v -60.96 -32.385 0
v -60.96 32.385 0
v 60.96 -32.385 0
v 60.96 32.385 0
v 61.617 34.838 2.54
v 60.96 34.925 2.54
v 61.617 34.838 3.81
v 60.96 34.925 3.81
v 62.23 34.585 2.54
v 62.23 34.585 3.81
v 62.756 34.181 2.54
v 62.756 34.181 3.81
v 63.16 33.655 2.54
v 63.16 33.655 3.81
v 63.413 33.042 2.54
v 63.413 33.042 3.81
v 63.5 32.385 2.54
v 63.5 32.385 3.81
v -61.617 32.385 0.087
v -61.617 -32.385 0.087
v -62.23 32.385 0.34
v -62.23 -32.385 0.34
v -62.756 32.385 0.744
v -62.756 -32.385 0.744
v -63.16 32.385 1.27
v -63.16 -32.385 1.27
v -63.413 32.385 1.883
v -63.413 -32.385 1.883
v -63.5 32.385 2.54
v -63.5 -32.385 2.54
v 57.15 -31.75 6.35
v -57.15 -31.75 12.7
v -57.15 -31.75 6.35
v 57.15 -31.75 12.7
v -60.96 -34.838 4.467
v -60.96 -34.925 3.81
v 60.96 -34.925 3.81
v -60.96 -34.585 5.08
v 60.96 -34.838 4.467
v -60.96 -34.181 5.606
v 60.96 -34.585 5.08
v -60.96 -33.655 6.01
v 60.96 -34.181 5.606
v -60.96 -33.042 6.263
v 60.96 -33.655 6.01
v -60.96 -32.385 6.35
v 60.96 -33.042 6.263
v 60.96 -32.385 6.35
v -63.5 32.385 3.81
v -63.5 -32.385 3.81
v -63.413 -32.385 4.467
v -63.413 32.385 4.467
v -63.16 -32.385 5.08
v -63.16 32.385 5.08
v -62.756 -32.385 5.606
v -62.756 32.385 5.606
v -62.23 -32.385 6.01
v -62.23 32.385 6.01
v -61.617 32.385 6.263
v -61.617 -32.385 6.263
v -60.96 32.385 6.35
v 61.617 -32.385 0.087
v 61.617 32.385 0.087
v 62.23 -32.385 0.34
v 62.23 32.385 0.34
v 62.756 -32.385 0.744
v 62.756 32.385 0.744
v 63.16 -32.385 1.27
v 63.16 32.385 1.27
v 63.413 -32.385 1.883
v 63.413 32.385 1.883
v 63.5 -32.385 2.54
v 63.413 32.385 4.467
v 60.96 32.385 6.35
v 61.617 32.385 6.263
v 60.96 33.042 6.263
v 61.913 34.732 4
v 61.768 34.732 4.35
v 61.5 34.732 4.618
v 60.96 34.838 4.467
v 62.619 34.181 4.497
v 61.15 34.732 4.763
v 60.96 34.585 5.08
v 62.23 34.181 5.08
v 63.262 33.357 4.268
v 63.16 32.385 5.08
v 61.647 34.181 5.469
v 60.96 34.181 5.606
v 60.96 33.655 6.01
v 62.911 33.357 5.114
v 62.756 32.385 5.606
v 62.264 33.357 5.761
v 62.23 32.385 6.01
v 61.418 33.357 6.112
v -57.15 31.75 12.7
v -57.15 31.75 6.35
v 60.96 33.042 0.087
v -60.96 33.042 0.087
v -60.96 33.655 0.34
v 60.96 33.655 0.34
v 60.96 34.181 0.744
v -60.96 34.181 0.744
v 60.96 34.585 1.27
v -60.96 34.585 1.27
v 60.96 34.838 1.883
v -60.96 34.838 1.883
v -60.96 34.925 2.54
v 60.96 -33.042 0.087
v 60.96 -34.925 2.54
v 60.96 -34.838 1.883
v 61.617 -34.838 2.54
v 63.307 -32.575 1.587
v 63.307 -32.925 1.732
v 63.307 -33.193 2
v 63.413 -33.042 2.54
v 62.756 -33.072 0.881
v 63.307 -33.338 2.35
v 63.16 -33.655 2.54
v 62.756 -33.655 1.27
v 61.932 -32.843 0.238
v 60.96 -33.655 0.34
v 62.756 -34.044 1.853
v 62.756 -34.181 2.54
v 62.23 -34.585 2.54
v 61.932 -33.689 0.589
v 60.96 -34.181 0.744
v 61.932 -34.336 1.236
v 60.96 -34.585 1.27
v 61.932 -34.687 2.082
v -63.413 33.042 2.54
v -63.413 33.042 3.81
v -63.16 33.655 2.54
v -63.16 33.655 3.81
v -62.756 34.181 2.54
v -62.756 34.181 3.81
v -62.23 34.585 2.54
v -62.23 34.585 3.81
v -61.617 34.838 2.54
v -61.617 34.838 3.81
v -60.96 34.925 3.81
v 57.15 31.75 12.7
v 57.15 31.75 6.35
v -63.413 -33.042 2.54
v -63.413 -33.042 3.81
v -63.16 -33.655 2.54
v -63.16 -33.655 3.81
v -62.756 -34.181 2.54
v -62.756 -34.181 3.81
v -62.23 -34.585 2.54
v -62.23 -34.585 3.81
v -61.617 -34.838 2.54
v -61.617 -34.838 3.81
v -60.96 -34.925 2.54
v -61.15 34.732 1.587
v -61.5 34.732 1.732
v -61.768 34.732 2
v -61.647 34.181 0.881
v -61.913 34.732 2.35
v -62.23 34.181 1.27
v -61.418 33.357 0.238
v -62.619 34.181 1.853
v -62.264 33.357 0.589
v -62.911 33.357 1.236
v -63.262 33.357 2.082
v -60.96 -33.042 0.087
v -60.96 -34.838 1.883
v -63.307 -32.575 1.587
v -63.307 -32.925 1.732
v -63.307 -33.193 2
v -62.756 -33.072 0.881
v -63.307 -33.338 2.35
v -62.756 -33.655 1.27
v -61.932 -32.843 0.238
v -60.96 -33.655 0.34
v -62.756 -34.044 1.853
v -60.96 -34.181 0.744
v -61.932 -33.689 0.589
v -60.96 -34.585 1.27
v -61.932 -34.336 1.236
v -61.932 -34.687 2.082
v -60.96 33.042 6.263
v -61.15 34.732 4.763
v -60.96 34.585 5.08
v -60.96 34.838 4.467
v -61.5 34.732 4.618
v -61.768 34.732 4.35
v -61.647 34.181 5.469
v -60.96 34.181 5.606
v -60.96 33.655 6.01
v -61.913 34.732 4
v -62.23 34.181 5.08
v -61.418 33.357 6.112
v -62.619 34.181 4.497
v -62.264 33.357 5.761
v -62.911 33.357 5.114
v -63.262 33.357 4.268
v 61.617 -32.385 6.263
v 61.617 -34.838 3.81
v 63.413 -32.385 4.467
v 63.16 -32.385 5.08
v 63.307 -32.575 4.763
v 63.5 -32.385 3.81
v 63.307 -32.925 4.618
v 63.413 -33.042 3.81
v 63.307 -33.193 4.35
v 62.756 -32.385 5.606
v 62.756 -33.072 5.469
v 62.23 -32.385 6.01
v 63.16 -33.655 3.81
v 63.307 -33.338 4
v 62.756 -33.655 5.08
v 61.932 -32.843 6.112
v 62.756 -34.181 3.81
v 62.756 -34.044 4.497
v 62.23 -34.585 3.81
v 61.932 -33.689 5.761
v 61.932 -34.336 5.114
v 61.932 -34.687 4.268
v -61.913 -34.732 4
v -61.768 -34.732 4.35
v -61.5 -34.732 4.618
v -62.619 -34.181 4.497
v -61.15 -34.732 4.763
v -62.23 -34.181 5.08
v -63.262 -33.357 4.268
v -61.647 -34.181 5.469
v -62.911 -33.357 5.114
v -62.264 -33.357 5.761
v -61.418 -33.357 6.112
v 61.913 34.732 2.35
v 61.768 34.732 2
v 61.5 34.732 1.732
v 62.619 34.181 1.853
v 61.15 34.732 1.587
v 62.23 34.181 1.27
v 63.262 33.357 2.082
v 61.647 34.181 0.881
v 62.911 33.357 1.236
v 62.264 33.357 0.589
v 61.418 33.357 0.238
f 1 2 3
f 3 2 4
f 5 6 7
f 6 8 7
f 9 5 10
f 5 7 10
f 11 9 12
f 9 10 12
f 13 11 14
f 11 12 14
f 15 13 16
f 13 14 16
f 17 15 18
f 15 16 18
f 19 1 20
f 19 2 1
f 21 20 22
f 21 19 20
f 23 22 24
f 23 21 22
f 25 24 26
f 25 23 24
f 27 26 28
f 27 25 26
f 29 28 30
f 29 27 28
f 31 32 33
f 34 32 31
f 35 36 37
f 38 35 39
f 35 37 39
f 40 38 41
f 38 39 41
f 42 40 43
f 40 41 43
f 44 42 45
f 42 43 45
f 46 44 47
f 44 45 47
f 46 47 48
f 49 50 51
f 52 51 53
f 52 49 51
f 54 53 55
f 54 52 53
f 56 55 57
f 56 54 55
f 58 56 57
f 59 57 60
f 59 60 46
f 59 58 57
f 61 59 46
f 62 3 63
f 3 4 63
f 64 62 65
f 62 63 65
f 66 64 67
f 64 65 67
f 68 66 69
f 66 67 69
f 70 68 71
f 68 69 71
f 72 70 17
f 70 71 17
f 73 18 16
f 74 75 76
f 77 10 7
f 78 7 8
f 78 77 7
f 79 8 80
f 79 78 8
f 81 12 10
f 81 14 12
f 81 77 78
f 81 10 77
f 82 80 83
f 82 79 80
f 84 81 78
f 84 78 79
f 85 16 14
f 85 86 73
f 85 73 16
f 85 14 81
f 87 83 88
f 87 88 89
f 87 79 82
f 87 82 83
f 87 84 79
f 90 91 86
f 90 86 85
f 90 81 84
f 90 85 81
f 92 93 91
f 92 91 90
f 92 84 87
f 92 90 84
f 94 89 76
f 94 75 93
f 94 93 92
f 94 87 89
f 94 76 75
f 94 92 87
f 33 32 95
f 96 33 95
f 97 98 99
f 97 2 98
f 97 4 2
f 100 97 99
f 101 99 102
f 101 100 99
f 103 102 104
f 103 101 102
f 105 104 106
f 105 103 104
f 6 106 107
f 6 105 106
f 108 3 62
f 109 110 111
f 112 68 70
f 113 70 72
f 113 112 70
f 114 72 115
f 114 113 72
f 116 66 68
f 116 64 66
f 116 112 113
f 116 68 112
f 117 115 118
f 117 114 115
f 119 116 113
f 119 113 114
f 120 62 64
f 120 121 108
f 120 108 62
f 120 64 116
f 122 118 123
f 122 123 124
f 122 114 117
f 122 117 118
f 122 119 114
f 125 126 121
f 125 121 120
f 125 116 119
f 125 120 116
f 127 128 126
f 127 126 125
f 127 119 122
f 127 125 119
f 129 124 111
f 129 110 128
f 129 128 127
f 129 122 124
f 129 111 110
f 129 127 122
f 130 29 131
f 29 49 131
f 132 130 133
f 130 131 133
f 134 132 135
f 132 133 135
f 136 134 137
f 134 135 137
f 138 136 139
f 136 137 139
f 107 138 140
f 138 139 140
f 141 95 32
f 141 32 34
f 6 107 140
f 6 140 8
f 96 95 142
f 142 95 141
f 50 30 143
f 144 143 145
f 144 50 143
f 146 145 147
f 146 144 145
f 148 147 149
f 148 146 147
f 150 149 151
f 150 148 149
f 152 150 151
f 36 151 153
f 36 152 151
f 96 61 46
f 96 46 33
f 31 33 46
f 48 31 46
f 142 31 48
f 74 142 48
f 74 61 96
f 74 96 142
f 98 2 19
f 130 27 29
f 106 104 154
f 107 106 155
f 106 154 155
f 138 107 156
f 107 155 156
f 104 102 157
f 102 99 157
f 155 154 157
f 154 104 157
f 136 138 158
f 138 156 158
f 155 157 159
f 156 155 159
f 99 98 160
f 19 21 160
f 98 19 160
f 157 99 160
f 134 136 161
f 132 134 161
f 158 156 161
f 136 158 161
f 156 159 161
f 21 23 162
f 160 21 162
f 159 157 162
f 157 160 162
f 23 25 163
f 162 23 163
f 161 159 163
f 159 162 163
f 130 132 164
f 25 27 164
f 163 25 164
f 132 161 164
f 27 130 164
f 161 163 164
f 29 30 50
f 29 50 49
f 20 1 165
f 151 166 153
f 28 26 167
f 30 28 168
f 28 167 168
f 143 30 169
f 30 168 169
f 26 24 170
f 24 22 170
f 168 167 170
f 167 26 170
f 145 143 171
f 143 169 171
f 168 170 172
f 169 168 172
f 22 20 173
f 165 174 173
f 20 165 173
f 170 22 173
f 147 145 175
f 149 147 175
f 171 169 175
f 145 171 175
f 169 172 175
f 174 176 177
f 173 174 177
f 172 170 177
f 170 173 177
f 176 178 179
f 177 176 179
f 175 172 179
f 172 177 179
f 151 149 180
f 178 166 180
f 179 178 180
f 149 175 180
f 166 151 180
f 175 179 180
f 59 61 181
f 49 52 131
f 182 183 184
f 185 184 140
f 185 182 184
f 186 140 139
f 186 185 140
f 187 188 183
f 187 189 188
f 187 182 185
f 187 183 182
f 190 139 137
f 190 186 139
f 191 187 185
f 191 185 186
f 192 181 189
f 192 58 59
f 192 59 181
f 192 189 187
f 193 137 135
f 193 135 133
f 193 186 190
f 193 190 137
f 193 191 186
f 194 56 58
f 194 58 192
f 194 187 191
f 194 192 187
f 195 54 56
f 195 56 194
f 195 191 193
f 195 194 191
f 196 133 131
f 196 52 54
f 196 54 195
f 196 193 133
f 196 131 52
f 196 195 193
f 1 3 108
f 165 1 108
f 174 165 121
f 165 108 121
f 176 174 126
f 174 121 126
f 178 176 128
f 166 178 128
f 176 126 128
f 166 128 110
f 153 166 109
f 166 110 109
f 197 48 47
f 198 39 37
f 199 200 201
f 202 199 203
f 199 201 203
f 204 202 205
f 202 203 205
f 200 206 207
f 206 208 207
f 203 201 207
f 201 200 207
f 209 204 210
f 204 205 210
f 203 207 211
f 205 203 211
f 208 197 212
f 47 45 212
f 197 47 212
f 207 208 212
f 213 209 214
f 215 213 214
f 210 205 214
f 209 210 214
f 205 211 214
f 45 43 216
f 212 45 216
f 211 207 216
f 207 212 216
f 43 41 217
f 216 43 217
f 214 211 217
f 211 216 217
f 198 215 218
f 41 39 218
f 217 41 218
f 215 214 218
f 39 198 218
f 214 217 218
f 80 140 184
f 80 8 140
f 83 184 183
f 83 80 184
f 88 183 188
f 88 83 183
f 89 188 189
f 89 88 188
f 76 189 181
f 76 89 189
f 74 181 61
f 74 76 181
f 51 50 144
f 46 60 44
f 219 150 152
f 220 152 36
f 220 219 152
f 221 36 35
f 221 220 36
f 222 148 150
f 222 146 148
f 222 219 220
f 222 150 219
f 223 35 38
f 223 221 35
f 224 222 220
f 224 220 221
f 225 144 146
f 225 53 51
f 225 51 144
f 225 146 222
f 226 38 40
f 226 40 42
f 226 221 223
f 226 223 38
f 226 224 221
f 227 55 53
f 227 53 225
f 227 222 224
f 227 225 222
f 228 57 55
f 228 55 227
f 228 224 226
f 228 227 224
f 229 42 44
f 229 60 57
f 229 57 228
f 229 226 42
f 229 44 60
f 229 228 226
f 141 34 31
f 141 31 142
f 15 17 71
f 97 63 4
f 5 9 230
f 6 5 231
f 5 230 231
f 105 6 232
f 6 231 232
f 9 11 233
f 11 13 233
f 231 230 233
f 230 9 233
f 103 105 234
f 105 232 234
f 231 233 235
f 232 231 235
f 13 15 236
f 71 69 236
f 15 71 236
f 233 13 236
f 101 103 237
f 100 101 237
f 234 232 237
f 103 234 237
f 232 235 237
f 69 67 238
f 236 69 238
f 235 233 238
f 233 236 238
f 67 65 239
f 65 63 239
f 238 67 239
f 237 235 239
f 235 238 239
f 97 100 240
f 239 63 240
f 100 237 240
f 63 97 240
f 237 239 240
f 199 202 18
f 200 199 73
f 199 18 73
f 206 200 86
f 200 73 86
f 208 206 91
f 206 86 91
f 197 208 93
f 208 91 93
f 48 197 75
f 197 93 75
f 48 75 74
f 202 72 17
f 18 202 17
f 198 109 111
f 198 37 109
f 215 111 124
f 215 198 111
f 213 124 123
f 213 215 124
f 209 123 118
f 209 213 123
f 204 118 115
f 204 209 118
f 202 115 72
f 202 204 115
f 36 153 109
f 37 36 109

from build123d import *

# Parameters (mm, degrees)
F0_W     = 127
F0_H     = 69.85
F1_DEPTH = 6.35
F2_W     = 114.3
F2_H     = 63.5
F3_DEPTH = 6.35
F4_R     = 2.54


with BuildPart() as f1:
    # F0 (on Top) → F1 (new body)
    with BuildSketch(Plane.XY):
        Rectangle(F0_W, F0_H)
    extrude(amount=F1_DEPTH)

    # F2 (on face) → F3 (join, symmetric)
    with BuildSketch(Plane.XY.offset(6.35)):
        Rectangle(F2_W, F2_H)
    extrude(amount=F3_DEPTH, both=True)

    # F4
    f4_edges = [f1.edges().sort_by_distance(p)[0] for p in [
        (0, -34.925, 0),
        (-63.5, 0, 0),
        (-63.5, 0, 6.35),
        (-63.5, -34.925, 3.175),
        (0, -34.925, 6.35),
        (63.5, 0, 0),
        (63.5, 0, 6.35),
        (63.5, 34.925, 3.175),
        (0, 34.925, 6.35),
        (63.5, -34.925, 3.175),
        (0, 34.925, 0),
        (-63.5, 34.925, 3.175),
    ]]
    fillet(f4_edges, radius=F4_R)


solid = f1.part
